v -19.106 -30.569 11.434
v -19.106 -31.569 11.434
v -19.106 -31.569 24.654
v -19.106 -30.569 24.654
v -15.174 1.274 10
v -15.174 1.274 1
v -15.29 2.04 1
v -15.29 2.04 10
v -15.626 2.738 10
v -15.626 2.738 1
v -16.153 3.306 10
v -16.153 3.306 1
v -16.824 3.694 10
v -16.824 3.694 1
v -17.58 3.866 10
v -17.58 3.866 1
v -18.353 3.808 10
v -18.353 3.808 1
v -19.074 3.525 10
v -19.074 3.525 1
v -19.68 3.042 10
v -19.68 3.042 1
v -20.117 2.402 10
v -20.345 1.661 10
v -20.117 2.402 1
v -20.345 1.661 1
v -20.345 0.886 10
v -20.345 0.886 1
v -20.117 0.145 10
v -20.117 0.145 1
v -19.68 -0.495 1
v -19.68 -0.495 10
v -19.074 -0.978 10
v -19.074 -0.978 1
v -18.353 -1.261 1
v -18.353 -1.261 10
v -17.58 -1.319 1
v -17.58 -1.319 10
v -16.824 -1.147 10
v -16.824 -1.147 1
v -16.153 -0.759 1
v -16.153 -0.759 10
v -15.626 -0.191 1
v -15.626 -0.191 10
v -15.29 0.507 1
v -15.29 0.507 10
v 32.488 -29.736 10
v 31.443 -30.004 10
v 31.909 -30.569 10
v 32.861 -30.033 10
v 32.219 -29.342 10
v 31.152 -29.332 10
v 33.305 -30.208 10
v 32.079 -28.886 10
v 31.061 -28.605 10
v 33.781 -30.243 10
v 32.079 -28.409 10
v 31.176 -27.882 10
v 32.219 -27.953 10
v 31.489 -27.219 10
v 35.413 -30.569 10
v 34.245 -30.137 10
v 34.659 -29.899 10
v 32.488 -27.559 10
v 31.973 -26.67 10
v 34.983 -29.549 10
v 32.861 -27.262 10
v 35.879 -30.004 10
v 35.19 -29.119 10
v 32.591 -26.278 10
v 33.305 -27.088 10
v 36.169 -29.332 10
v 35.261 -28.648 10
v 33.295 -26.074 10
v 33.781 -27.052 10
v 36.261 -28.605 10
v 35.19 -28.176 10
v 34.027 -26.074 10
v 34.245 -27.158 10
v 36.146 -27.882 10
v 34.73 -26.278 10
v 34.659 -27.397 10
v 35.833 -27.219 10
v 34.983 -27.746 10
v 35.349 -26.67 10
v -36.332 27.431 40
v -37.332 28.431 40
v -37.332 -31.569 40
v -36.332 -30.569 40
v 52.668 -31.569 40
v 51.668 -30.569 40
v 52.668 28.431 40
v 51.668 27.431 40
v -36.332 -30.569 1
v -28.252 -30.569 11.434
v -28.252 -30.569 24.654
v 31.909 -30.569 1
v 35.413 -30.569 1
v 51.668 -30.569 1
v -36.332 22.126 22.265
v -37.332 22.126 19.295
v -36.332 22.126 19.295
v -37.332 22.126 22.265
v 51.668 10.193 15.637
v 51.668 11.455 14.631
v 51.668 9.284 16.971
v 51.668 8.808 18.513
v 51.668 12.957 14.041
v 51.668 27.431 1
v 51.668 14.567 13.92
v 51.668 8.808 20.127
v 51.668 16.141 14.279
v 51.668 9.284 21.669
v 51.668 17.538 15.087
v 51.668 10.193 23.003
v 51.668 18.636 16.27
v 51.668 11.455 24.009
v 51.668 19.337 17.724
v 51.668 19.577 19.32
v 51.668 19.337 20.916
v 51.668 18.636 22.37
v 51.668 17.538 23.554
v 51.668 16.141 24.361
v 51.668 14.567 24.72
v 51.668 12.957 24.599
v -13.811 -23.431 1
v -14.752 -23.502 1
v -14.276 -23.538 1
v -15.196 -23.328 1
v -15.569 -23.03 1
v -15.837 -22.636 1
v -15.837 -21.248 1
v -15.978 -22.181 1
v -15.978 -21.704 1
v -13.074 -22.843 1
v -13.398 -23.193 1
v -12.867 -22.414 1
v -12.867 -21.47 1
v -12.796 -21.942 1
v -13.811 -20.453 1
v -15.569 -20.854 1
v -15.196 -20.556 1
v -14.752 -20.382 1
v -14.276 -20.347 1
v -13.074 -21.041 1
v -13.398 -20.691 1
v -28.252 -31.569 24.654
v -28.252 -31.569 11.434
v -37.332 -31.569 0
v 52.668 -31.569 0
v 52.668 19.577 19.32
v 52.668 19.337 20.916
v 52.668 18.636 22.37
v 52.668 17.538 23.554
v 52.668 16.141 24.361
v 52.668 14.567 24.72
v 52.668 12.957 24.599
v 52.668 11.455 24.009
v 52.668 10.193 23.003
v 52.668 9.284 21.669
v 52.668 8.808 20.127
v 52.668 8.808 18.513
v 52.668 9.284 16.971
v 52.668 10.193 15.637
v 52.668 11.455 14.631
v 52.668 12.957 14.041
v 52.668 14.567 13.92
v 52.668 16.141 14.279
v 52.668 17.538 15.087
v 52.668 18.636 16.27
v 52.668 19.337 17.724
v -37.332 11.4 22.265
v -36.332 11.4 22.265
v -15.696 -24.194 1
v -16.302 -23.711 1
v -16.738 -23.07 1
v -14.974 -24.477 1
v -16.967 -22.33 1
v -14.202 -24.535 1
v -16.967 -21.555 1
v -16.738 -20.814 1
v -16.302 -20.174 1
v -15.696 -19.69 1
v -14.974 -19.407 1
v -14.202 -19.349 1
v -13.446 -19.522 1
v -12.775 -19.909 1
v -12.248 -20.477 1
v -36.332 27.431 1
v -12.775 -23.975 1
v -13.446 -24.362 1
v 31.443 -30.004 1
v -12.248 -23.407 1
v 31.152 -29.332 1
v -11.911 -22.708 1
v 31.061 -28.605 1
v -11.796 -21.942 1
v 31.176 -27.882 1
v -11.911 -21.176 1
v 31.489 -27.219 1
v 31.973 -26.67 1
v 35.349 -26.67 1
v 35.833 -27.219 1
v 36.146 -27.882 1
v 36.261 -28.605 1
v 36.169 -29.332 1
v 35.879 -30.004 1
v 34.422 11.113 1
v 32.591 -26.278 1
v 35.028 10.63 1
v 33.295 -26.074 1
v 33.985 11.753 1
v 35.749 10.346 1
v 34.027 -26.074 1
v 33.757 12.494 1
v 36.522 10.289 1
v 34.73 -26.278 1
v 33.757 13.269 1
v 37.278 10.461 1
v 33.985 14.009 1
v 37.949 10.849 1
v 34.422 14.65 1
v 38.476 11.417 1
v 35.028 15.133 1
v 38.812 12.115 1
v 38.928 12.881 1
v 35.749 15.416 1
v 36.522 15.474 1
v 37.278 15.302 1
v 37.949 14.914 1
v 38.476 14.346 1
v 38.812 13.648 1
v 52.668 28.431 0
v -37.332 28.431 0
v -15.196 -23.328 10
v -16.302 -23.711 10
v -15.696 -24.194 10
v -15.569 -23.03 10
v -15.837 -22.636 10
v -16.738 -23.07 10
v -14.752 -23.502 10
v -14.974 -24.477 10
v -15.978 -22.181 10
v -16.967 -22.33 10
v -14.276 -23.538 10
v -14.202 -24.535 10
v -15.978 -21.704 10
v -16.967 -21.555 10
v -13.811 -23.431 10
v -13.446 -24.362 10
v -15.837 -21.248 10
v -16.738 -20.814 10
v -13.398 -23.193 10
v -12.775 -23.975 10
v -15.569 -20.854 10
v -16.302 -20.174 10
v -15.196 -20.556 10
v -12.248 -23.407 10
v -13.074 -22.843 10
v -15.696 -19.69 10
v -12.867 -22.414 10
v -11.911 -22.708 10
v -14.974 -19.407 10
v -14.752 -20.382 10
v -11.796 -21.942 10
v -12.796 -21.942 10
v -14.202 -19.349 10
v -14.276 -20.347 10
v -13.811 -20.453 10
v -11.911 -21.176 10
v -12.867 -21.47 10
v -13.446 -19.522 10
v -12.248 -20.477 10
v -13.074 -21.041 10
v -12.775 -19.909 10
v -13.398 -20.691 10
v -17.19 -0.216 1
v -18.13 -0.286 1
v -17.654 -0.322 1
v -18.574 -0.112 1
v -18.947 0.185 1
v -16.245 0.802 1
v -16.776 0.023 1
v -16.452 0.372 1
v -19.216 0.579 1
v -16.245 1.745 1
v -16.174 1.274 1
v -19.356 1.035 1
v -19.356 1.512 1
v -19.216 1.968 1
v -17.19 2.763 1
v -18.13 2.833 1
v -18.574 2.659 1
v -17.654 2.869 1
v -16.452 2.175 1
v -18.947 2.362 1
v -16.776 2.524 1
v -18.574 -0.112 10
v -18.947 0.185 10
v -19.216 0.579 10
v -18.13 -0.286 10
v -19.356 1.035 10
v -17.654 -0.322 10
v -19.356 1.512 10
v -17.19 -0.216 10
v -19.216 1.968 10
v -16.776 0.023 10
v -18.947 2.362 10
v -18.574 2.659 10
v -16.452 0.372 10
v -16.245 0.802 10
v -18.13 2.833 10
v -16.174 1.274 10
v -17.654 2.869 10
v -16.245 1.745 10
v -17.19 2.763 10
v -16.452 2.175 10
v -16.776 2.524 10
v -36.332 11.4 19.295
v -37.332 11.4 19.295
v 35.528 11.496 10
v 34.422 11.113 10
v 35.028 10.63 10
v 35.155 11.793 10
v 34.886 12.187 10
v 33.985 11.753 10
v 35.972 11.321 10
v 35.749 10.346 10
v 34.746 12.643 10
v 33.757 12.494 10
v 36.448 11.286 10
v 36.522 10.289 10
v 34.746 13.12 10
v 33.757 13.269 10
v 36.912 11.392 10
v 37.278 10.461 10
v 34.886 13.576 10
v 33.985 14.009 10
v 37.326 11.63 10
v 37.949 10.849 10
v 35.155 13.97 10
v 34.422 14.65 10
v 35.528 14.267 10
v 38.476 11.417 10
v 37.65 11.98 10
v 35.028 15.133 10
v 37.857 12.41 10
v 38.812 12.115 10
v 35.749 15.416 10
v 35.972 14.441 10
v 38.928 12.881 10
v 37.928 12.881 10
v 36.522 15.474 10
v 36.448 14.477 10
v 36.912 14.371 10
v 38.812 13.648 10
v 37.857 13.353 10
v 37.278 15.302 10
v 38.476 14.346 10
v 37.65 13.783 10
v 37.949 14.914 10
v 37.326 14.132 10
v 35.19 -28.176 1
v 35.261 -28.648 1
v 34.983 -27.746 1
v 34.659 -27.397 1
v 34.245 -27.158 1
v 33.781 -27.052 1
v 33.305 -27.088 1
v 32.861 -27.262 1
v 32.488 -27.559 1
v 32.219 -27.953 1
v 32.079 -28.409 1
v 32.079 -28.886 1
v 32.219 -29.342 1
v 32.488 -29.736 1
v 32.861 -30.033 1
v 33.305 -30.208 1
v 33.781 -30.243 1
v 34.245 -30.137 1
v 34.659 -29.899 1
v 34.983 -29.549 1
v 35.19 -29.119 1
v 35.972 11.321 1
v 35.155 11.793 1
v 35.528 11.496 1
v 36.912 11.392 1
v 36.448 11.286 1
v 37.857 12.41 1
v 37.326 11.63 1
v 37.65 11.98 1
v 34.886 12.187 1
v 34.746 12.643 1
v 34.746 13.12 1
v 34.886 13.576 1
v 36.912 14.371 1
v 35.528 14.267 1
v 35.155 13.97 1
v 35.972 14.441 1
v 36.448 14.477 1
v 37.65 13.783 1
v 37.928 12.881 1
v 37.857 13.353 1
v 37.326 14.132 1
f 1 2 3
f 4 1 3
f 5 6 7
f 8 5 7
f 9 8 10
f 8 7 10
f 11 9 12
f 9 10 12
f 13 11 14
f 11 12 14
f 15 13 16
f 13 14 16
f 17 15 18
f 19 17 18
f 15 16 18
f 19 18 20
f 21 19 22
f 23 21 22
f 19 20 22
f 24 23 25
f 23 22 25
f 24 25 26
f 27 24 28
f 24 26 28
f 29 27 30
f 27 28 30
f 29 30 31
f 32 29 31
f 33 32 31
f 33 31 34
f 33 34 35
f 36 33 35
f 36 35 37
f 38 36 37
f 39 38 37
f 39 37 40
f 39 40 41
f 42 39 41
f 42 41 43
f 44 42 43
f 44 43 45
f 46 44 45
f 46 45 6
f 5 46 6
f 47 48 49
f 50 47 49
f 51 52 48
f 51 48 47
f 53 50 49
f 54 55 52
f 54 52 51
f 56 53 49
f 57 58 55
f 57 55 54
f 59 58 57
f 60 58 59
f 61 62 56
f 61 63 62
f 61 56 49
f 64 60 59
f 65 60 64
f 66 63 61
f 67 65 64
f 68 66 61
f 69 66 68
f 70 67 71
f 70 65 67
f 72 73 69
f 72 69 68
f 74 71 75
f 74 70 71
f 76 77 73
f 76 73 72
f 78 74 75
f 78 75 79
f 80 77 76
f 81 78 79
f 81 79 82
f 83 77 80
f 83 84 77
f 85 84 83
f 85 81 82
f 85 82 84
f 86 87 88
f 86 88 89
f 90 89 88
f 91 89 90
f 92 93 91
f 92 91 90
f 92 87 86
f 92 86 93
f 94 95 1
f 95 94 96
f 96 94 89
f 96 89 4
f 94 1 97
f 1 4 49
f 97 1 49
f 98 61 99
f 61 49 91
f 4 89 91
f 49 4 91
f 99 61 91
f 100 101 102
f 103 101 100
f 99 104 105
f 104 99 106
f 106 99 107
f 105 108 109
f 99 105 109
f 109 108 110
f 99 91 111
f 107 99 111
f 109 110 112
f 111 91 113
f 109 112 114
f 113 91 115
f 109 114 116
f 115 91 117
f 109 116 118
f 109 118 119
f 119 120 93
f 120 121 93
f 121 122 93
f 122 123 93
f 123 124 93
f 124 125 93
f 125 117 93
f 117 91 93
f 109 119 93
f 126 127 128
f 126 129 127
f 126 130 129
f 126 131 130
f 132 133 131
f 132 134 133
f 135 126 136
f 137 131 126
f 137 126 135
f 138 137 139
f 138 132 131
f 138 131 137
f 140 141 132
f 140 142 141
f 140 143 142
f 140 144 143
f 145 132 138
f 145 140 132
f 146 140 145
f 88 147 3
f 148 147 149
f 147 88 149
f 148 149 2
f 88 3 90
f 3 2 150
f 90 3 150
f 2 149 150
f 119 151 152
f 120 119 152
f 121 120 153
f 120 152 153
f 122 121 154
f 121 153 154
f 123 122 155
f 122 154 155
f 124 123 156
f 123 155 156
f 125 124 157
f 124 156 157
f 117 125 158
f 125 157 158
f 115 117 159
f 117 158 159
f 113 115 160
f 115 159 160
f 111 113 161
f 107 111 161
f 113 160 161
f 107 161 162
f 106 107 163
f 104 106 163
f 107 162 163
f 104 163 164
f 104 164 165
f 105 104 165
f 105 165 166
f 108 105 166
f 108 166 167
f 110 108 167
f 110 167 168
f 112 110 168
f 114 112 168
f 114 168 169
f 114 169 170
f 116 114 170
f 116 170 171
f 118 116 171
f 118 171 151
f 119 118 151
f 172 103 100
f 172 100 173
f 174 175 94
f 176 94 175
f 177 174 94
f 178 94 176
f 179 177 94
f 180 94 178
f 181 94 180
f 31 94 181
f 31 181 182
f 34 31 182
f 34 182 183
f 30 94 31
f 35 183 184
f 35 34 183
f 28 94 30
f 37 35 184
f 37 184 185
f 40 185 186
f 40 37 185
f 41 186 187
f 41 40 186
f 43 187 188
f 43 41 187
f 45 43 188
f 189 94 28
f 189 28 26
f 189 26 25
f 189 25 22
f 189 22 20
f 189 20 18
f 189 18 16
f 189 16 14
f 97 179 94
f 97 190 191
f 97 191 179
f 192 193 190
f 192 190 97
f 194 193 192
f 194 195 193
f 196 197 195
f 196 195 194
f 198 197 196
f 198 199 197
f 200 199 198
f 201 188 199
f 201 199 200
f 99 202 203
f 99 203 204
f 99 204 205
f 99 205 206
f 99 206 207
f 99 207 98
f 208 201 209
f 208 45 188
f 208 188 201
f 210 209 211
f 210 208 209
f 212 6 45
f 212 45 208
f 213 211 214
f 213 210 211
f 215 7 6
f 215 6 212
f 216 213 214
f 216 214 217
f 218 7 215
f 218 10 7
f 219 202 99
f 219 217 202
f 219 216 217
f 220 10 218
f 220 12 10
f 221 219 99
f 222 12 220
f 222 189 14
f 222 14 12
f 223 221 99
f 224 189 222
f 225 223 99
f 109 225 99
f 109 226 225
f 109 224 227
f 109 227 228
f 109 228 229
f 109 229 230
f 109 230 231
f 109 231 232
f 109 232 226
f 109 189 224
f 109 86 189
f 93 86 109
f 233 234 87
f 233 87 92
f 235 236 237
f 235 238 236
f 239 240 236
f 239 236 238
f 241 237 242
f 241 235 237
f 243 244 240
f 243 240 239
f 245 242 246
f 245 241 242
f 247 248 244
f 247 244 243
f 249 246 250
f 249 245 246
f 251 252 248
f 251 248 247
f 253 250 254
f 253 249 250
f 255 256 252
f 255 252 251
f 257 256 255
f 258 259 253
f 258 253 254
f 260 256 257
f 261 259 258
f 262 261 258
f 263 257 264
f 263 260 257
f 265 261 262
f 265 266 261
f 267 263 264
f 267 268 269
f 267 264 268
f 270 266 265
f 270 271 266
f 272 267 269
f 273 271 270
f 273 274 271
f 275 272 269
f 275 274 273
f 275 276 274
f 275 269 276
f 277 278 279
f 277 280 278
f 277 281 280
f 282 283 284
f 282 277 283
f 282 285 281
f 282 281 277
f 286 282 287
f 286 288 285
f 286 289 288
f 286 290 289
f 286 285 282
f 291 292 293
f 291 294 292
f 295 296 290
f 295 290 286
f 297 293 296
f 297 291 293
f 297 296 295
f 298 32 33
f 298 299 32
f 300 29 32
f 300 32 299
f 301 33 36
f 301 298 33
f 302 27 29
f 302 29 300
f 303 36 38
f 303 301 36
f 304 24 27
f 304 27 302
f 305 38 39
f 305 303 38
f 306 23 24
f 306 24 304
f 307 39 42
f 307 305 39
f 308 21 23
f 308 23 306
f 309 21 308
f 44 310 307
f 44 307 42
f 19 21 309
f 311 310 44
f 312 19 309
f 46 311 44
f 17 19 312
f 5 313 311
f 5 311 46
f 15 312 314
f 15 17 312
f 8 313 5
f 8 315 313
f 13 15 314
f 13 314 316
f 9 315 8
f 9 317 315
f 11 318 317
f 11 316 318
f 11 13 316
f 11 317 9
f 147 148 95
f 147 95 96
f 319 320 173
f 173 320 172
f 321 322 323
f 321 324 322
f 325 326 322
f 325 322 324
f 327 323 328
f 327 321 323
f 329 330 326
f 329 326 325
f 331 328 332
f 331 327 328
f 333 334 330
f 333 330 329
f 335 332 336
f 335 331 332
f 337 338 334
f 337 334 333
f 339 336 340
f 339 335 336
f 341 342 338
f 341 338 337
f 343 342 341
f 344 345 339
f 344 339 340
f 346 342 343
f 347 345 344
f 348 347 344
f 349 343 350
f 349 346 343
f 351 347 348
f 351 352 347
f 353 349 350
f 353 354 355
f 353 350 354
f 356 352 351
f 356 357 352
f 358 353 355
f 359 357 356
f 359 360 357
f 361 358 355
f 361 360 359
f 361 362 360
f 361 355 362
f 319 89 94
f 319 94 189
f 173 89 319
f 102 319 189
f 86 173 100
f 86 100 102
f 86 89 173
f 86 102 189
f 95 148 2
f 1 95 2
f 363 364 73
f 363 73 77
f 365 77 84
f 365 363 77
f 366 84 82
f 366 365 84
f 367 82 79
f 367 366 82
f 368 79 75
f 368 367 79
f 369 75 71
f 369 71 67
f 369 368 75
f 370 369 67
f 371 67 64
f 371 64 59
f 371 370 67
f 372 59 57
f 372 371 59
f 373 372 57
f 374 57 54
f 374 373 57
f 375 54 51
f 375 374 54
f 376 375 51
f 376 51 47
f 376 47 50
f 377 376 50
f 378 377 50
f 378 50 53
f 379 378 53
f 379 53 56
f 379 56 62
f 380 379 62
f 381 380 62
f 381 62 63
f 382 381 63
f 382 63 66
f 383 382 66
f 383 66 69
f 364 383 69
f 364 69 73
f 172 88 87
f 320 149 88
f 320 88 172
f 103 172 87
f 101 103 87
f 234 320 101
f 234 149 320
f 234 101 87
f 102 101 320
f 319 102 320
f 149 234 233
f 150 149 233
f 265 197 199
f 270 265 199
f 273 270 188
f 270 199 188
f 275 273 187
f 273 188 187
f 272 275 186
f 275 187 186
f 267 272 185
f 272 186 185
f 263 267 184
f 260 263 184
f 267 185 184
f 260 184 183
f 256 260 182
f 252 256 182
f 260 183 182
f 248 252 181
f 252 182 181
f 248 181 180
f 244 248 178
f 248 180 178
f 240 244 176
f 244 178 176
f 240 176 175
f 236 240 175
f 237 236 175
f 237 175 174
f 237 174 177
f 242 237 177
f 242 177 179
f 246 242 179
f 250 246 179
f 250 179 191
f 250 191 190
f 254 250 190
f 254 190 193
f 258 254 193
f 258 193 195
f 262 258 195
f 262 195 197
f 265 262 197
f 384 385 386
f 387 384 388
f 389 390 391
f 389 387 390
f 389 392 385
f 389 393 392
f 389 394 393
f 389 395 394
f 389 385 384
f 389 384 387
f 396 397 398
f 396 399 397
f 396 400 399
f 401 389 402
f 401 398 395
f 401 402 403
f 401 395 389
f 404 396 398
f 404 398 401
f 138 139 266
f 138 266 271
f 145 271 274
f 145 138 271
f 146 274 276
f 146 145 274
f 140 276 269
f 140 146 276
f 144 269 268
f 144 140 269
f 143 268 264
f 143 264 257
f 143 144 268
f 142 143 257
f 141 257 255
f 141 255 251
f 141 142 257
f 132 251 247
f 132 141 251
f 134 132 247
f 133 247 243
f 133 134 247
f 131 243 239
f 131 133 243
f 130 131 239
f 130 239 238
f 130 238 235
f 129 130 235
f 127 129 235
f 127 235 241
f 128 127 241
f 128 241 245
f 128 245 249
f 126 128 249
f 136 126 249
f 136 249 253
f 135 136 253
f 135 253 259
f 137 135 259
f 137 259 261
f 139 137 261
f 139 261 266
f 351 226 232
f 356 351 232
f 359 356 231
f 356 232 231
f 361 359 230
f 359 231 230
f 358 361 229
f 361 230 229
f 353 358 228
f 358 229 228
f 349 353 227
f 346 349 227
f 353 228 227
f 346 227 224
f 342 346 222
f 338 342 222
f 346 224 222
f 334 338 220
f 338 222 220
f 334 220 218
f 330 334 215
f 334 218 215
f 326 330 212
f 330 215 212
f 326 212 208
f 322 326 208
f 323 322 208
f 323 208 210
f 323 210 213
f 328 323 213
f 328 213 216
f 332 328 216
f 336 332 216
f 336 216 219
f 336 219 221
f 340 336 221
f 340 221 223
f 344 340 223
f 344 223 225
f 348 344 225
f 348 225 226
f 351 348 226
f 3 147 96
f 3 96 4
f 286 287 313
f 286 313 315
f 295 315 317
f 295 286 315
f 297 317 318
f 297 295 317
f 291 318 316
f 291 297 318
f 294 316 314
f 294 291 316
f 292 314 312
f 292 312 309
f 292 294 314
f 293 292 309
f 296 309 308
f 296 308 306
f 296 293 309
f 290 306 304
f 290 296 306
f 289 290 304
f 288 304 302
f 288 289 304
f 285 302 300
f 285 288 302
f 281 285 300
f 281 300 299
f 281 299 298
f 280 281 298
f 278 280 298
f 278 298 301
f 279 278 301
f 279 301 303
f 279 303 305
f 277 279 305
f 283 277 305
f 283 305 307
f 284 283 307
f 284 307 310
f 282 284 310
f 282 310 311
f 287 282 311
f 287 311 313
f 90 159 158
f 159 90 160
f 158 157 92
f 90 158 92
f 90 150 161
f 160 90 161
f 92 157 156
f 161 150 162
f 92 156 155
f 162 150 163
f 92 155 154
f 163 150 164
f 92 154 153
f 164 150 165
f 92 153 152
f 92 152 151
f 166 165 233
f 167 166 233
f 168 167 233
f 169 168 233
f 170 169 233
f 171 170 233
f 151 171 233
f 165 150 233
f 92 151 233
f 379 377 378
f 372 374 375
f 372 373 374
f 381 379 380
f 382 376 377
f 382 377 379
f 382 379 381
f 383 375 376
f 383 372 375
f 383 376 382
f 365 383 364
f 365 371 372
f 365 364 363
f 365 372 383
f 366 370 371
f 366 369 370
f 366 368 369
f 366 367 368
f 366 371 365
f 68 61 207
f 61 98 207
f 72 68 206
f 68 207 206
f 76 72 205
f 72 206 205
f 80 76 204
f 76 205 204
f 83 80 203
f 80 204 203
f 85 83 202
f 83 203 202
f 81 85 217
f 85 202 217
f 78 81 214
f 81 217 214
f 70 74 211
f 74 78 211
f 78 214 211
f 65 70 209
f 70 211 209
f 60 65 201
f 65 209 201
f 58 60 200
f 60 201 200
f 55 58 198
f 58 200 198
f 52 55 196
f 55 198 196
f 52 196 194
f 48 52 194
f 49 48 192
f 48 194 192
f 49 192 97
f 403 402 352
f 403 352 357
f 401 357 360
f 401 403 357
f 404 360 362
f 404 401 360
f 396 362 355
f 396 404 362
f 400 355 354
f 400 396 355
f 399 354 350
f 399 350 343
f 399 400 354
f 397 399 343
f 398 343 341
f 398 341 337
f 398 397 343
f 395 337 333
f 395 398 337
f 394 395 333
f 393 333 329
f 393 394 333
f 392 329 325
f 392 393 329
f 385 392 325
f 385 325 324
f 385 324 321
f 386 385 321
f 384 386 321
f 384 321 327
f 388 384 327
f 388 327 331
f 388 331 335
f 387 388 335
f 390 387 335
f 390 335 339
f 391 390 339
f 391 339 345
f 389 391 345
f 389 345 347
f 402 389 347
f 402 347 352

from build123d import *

# Parameters (mm, degrees)
F0_W      = 90
F0_H      = 60
F0_R      = 2.6
F0_R_2    = 1.6
F1_DEPTH  = 40
F2_W      = 88
F2_H      = 58
F3_DEPTH  = 39
F4_DEPTH  = 10
F5_W      = 9.1457683593
F5_H      = 13.2199376822
F6_DEPTH  = 2
F7_W      = 10.7257449999
F7_H      = 2.9699578881
F8_DEPTH  = 2
F9_R      = 5.4148812487
F10_DEPTH = 2


with BuildPart() as f1:
    # F0 (on Top) → F1 (new body)
    with BuildSketch(Plane.XY):
        with Locations((7.6679475605, -1.568697635)):
            Rectangle(F0_W, F0_H)
        with Locations((-14.3958524395, -21.942097635)):
            Circle(F0_R, mode=Mode.SUBTRACT)
        with Locations((33.6609475605, -28.647697635)):
            Circle(F0_R, mode=Mode.SUBTRACT)
        with Locations((-17.7740524395, 1.273502365)):
            Circle(F0_R, mode=Mode.SUBTRACT)
        with Locations((36.3279475605, 12.881302365)):
            Circle(F0_R, mode=Mode.SUBTRACT)
        with Locations((-17.7740524395, 1.273502365)):
            Circle(F0_R)
        with Locations((-17.7740524395, 1.273502365)):
            Circle(F0_R_2, mode=Mode.SUBTRACT)
        with Locations((-14.3958524395, -21.942097635)):
            Circle(F0_R)
        with Locations((-14.3958524395, -21.942097635)):
            Circle(F0_R_2, mode=Mode.SUBTRACT)
        with Locations((33.6609475605, -28.647697635)):
            Circle(F0_R)
        with Locations((33.6609475605, -28.647697635)):
            Circle(F0_R_2, mode=Mode.SUBTRACT)
        with Locations((36.3279475605, 12.881302365)):
            Circle(F0_R)
        with Locations((36.3279475605, 12.881302365)):
            Circle(F0_R_2, mode=Mode.SUBTRACT)
        with Locations((-17.7740524395, 1.273502365)):
            Circle(F0_R_2)
        with Locations((-14.3958524395, -21.942097635)):
            Circle(F0_R_2)
        with Locations((33.6609475605, -28.647697635)):
            Circle(F0_R_2)
        with Locations((36.3279475605, 12.881302365)):
            Circle(F0_R_2)
    extrude(amount=F1_DEPTH)

    # F2 (on face) → F3 (cut)
    with BuildSketch(Plane.XY.offset(40)):
        with Locations((7.6679475605, -1.568697635)):
            Rectangle(F2_W, F2_H)
    extrude(amount=-F3_DEPTH, mode=Mode.SUBTRACT)

    # F0 (on Top) → F4 (join)
    with BuildSketch(Plane.XY):
        with Locations((-14.3958524395, -21.942097635)):
            Circle(F0_R)
        with Locations((-14.3958524395, -21.942097635)):
            Circle(F0_R_2, mode=Mode.SUBTRACT)
        with Locations((-17.7740524395, 1.273502365)):
            Circle(F0_R)
        with Locations((-17.7740524395, 1.273502365)):
            Circle(F0_R_2, mode=Mode.SUBTRACT)
        with Locations((33.6609475605, -28.647697635)):
            Circle(F0_R)
        with Locations((33.6609475605, -28.647697635)):
            Circle(F0_R_2, mode=Mode.SUBTRACT)
        with Locations((36.3279475605, 12.881302365)):
            Circle(F0_R)
        with Locations((36.3279475605, 12.881302365)):
            Circle(F0_R_2, mode=Mode.SUBTRACT)
    extrude(amount=F4_DEPTH)

    # F5 (on face) → F6 (cut)
    with BuildSketch(Plane.XZ.offset(31.568697635)):
        with Locations((-23.679333739, 18.0436503142)):
            Rectangle(F5_W, F5_H)
    extrude(amount=-F6_DEPTH, mode=Mode.SUBTRACT)

    # F7 (on face) → F8 (cut)
    with BuildSketch(Plane(origin=(-37.3320524395, 0, 0), x_dir=(0, -1, 0), z_dir=(-1, 0, 0))):
        with Locations((-16.7629956268, 20.779600367)):
            Rectangle(F7_W, F7_H)
    extrude(amount=-F8_DEPTH, mode=Mode.SUBTRACT)

    # F9 (on face) → F10 (cut)
    with BuildSketch(Plane.YZ.offset(52.6679475605)):
        with Locations((14.1623625532, 19.3200558424)):
            Circle(F9_R)
    extrude(amount=-F10_DEPTH, mode=Mode.SUBTRACT)


solid = f1.part
